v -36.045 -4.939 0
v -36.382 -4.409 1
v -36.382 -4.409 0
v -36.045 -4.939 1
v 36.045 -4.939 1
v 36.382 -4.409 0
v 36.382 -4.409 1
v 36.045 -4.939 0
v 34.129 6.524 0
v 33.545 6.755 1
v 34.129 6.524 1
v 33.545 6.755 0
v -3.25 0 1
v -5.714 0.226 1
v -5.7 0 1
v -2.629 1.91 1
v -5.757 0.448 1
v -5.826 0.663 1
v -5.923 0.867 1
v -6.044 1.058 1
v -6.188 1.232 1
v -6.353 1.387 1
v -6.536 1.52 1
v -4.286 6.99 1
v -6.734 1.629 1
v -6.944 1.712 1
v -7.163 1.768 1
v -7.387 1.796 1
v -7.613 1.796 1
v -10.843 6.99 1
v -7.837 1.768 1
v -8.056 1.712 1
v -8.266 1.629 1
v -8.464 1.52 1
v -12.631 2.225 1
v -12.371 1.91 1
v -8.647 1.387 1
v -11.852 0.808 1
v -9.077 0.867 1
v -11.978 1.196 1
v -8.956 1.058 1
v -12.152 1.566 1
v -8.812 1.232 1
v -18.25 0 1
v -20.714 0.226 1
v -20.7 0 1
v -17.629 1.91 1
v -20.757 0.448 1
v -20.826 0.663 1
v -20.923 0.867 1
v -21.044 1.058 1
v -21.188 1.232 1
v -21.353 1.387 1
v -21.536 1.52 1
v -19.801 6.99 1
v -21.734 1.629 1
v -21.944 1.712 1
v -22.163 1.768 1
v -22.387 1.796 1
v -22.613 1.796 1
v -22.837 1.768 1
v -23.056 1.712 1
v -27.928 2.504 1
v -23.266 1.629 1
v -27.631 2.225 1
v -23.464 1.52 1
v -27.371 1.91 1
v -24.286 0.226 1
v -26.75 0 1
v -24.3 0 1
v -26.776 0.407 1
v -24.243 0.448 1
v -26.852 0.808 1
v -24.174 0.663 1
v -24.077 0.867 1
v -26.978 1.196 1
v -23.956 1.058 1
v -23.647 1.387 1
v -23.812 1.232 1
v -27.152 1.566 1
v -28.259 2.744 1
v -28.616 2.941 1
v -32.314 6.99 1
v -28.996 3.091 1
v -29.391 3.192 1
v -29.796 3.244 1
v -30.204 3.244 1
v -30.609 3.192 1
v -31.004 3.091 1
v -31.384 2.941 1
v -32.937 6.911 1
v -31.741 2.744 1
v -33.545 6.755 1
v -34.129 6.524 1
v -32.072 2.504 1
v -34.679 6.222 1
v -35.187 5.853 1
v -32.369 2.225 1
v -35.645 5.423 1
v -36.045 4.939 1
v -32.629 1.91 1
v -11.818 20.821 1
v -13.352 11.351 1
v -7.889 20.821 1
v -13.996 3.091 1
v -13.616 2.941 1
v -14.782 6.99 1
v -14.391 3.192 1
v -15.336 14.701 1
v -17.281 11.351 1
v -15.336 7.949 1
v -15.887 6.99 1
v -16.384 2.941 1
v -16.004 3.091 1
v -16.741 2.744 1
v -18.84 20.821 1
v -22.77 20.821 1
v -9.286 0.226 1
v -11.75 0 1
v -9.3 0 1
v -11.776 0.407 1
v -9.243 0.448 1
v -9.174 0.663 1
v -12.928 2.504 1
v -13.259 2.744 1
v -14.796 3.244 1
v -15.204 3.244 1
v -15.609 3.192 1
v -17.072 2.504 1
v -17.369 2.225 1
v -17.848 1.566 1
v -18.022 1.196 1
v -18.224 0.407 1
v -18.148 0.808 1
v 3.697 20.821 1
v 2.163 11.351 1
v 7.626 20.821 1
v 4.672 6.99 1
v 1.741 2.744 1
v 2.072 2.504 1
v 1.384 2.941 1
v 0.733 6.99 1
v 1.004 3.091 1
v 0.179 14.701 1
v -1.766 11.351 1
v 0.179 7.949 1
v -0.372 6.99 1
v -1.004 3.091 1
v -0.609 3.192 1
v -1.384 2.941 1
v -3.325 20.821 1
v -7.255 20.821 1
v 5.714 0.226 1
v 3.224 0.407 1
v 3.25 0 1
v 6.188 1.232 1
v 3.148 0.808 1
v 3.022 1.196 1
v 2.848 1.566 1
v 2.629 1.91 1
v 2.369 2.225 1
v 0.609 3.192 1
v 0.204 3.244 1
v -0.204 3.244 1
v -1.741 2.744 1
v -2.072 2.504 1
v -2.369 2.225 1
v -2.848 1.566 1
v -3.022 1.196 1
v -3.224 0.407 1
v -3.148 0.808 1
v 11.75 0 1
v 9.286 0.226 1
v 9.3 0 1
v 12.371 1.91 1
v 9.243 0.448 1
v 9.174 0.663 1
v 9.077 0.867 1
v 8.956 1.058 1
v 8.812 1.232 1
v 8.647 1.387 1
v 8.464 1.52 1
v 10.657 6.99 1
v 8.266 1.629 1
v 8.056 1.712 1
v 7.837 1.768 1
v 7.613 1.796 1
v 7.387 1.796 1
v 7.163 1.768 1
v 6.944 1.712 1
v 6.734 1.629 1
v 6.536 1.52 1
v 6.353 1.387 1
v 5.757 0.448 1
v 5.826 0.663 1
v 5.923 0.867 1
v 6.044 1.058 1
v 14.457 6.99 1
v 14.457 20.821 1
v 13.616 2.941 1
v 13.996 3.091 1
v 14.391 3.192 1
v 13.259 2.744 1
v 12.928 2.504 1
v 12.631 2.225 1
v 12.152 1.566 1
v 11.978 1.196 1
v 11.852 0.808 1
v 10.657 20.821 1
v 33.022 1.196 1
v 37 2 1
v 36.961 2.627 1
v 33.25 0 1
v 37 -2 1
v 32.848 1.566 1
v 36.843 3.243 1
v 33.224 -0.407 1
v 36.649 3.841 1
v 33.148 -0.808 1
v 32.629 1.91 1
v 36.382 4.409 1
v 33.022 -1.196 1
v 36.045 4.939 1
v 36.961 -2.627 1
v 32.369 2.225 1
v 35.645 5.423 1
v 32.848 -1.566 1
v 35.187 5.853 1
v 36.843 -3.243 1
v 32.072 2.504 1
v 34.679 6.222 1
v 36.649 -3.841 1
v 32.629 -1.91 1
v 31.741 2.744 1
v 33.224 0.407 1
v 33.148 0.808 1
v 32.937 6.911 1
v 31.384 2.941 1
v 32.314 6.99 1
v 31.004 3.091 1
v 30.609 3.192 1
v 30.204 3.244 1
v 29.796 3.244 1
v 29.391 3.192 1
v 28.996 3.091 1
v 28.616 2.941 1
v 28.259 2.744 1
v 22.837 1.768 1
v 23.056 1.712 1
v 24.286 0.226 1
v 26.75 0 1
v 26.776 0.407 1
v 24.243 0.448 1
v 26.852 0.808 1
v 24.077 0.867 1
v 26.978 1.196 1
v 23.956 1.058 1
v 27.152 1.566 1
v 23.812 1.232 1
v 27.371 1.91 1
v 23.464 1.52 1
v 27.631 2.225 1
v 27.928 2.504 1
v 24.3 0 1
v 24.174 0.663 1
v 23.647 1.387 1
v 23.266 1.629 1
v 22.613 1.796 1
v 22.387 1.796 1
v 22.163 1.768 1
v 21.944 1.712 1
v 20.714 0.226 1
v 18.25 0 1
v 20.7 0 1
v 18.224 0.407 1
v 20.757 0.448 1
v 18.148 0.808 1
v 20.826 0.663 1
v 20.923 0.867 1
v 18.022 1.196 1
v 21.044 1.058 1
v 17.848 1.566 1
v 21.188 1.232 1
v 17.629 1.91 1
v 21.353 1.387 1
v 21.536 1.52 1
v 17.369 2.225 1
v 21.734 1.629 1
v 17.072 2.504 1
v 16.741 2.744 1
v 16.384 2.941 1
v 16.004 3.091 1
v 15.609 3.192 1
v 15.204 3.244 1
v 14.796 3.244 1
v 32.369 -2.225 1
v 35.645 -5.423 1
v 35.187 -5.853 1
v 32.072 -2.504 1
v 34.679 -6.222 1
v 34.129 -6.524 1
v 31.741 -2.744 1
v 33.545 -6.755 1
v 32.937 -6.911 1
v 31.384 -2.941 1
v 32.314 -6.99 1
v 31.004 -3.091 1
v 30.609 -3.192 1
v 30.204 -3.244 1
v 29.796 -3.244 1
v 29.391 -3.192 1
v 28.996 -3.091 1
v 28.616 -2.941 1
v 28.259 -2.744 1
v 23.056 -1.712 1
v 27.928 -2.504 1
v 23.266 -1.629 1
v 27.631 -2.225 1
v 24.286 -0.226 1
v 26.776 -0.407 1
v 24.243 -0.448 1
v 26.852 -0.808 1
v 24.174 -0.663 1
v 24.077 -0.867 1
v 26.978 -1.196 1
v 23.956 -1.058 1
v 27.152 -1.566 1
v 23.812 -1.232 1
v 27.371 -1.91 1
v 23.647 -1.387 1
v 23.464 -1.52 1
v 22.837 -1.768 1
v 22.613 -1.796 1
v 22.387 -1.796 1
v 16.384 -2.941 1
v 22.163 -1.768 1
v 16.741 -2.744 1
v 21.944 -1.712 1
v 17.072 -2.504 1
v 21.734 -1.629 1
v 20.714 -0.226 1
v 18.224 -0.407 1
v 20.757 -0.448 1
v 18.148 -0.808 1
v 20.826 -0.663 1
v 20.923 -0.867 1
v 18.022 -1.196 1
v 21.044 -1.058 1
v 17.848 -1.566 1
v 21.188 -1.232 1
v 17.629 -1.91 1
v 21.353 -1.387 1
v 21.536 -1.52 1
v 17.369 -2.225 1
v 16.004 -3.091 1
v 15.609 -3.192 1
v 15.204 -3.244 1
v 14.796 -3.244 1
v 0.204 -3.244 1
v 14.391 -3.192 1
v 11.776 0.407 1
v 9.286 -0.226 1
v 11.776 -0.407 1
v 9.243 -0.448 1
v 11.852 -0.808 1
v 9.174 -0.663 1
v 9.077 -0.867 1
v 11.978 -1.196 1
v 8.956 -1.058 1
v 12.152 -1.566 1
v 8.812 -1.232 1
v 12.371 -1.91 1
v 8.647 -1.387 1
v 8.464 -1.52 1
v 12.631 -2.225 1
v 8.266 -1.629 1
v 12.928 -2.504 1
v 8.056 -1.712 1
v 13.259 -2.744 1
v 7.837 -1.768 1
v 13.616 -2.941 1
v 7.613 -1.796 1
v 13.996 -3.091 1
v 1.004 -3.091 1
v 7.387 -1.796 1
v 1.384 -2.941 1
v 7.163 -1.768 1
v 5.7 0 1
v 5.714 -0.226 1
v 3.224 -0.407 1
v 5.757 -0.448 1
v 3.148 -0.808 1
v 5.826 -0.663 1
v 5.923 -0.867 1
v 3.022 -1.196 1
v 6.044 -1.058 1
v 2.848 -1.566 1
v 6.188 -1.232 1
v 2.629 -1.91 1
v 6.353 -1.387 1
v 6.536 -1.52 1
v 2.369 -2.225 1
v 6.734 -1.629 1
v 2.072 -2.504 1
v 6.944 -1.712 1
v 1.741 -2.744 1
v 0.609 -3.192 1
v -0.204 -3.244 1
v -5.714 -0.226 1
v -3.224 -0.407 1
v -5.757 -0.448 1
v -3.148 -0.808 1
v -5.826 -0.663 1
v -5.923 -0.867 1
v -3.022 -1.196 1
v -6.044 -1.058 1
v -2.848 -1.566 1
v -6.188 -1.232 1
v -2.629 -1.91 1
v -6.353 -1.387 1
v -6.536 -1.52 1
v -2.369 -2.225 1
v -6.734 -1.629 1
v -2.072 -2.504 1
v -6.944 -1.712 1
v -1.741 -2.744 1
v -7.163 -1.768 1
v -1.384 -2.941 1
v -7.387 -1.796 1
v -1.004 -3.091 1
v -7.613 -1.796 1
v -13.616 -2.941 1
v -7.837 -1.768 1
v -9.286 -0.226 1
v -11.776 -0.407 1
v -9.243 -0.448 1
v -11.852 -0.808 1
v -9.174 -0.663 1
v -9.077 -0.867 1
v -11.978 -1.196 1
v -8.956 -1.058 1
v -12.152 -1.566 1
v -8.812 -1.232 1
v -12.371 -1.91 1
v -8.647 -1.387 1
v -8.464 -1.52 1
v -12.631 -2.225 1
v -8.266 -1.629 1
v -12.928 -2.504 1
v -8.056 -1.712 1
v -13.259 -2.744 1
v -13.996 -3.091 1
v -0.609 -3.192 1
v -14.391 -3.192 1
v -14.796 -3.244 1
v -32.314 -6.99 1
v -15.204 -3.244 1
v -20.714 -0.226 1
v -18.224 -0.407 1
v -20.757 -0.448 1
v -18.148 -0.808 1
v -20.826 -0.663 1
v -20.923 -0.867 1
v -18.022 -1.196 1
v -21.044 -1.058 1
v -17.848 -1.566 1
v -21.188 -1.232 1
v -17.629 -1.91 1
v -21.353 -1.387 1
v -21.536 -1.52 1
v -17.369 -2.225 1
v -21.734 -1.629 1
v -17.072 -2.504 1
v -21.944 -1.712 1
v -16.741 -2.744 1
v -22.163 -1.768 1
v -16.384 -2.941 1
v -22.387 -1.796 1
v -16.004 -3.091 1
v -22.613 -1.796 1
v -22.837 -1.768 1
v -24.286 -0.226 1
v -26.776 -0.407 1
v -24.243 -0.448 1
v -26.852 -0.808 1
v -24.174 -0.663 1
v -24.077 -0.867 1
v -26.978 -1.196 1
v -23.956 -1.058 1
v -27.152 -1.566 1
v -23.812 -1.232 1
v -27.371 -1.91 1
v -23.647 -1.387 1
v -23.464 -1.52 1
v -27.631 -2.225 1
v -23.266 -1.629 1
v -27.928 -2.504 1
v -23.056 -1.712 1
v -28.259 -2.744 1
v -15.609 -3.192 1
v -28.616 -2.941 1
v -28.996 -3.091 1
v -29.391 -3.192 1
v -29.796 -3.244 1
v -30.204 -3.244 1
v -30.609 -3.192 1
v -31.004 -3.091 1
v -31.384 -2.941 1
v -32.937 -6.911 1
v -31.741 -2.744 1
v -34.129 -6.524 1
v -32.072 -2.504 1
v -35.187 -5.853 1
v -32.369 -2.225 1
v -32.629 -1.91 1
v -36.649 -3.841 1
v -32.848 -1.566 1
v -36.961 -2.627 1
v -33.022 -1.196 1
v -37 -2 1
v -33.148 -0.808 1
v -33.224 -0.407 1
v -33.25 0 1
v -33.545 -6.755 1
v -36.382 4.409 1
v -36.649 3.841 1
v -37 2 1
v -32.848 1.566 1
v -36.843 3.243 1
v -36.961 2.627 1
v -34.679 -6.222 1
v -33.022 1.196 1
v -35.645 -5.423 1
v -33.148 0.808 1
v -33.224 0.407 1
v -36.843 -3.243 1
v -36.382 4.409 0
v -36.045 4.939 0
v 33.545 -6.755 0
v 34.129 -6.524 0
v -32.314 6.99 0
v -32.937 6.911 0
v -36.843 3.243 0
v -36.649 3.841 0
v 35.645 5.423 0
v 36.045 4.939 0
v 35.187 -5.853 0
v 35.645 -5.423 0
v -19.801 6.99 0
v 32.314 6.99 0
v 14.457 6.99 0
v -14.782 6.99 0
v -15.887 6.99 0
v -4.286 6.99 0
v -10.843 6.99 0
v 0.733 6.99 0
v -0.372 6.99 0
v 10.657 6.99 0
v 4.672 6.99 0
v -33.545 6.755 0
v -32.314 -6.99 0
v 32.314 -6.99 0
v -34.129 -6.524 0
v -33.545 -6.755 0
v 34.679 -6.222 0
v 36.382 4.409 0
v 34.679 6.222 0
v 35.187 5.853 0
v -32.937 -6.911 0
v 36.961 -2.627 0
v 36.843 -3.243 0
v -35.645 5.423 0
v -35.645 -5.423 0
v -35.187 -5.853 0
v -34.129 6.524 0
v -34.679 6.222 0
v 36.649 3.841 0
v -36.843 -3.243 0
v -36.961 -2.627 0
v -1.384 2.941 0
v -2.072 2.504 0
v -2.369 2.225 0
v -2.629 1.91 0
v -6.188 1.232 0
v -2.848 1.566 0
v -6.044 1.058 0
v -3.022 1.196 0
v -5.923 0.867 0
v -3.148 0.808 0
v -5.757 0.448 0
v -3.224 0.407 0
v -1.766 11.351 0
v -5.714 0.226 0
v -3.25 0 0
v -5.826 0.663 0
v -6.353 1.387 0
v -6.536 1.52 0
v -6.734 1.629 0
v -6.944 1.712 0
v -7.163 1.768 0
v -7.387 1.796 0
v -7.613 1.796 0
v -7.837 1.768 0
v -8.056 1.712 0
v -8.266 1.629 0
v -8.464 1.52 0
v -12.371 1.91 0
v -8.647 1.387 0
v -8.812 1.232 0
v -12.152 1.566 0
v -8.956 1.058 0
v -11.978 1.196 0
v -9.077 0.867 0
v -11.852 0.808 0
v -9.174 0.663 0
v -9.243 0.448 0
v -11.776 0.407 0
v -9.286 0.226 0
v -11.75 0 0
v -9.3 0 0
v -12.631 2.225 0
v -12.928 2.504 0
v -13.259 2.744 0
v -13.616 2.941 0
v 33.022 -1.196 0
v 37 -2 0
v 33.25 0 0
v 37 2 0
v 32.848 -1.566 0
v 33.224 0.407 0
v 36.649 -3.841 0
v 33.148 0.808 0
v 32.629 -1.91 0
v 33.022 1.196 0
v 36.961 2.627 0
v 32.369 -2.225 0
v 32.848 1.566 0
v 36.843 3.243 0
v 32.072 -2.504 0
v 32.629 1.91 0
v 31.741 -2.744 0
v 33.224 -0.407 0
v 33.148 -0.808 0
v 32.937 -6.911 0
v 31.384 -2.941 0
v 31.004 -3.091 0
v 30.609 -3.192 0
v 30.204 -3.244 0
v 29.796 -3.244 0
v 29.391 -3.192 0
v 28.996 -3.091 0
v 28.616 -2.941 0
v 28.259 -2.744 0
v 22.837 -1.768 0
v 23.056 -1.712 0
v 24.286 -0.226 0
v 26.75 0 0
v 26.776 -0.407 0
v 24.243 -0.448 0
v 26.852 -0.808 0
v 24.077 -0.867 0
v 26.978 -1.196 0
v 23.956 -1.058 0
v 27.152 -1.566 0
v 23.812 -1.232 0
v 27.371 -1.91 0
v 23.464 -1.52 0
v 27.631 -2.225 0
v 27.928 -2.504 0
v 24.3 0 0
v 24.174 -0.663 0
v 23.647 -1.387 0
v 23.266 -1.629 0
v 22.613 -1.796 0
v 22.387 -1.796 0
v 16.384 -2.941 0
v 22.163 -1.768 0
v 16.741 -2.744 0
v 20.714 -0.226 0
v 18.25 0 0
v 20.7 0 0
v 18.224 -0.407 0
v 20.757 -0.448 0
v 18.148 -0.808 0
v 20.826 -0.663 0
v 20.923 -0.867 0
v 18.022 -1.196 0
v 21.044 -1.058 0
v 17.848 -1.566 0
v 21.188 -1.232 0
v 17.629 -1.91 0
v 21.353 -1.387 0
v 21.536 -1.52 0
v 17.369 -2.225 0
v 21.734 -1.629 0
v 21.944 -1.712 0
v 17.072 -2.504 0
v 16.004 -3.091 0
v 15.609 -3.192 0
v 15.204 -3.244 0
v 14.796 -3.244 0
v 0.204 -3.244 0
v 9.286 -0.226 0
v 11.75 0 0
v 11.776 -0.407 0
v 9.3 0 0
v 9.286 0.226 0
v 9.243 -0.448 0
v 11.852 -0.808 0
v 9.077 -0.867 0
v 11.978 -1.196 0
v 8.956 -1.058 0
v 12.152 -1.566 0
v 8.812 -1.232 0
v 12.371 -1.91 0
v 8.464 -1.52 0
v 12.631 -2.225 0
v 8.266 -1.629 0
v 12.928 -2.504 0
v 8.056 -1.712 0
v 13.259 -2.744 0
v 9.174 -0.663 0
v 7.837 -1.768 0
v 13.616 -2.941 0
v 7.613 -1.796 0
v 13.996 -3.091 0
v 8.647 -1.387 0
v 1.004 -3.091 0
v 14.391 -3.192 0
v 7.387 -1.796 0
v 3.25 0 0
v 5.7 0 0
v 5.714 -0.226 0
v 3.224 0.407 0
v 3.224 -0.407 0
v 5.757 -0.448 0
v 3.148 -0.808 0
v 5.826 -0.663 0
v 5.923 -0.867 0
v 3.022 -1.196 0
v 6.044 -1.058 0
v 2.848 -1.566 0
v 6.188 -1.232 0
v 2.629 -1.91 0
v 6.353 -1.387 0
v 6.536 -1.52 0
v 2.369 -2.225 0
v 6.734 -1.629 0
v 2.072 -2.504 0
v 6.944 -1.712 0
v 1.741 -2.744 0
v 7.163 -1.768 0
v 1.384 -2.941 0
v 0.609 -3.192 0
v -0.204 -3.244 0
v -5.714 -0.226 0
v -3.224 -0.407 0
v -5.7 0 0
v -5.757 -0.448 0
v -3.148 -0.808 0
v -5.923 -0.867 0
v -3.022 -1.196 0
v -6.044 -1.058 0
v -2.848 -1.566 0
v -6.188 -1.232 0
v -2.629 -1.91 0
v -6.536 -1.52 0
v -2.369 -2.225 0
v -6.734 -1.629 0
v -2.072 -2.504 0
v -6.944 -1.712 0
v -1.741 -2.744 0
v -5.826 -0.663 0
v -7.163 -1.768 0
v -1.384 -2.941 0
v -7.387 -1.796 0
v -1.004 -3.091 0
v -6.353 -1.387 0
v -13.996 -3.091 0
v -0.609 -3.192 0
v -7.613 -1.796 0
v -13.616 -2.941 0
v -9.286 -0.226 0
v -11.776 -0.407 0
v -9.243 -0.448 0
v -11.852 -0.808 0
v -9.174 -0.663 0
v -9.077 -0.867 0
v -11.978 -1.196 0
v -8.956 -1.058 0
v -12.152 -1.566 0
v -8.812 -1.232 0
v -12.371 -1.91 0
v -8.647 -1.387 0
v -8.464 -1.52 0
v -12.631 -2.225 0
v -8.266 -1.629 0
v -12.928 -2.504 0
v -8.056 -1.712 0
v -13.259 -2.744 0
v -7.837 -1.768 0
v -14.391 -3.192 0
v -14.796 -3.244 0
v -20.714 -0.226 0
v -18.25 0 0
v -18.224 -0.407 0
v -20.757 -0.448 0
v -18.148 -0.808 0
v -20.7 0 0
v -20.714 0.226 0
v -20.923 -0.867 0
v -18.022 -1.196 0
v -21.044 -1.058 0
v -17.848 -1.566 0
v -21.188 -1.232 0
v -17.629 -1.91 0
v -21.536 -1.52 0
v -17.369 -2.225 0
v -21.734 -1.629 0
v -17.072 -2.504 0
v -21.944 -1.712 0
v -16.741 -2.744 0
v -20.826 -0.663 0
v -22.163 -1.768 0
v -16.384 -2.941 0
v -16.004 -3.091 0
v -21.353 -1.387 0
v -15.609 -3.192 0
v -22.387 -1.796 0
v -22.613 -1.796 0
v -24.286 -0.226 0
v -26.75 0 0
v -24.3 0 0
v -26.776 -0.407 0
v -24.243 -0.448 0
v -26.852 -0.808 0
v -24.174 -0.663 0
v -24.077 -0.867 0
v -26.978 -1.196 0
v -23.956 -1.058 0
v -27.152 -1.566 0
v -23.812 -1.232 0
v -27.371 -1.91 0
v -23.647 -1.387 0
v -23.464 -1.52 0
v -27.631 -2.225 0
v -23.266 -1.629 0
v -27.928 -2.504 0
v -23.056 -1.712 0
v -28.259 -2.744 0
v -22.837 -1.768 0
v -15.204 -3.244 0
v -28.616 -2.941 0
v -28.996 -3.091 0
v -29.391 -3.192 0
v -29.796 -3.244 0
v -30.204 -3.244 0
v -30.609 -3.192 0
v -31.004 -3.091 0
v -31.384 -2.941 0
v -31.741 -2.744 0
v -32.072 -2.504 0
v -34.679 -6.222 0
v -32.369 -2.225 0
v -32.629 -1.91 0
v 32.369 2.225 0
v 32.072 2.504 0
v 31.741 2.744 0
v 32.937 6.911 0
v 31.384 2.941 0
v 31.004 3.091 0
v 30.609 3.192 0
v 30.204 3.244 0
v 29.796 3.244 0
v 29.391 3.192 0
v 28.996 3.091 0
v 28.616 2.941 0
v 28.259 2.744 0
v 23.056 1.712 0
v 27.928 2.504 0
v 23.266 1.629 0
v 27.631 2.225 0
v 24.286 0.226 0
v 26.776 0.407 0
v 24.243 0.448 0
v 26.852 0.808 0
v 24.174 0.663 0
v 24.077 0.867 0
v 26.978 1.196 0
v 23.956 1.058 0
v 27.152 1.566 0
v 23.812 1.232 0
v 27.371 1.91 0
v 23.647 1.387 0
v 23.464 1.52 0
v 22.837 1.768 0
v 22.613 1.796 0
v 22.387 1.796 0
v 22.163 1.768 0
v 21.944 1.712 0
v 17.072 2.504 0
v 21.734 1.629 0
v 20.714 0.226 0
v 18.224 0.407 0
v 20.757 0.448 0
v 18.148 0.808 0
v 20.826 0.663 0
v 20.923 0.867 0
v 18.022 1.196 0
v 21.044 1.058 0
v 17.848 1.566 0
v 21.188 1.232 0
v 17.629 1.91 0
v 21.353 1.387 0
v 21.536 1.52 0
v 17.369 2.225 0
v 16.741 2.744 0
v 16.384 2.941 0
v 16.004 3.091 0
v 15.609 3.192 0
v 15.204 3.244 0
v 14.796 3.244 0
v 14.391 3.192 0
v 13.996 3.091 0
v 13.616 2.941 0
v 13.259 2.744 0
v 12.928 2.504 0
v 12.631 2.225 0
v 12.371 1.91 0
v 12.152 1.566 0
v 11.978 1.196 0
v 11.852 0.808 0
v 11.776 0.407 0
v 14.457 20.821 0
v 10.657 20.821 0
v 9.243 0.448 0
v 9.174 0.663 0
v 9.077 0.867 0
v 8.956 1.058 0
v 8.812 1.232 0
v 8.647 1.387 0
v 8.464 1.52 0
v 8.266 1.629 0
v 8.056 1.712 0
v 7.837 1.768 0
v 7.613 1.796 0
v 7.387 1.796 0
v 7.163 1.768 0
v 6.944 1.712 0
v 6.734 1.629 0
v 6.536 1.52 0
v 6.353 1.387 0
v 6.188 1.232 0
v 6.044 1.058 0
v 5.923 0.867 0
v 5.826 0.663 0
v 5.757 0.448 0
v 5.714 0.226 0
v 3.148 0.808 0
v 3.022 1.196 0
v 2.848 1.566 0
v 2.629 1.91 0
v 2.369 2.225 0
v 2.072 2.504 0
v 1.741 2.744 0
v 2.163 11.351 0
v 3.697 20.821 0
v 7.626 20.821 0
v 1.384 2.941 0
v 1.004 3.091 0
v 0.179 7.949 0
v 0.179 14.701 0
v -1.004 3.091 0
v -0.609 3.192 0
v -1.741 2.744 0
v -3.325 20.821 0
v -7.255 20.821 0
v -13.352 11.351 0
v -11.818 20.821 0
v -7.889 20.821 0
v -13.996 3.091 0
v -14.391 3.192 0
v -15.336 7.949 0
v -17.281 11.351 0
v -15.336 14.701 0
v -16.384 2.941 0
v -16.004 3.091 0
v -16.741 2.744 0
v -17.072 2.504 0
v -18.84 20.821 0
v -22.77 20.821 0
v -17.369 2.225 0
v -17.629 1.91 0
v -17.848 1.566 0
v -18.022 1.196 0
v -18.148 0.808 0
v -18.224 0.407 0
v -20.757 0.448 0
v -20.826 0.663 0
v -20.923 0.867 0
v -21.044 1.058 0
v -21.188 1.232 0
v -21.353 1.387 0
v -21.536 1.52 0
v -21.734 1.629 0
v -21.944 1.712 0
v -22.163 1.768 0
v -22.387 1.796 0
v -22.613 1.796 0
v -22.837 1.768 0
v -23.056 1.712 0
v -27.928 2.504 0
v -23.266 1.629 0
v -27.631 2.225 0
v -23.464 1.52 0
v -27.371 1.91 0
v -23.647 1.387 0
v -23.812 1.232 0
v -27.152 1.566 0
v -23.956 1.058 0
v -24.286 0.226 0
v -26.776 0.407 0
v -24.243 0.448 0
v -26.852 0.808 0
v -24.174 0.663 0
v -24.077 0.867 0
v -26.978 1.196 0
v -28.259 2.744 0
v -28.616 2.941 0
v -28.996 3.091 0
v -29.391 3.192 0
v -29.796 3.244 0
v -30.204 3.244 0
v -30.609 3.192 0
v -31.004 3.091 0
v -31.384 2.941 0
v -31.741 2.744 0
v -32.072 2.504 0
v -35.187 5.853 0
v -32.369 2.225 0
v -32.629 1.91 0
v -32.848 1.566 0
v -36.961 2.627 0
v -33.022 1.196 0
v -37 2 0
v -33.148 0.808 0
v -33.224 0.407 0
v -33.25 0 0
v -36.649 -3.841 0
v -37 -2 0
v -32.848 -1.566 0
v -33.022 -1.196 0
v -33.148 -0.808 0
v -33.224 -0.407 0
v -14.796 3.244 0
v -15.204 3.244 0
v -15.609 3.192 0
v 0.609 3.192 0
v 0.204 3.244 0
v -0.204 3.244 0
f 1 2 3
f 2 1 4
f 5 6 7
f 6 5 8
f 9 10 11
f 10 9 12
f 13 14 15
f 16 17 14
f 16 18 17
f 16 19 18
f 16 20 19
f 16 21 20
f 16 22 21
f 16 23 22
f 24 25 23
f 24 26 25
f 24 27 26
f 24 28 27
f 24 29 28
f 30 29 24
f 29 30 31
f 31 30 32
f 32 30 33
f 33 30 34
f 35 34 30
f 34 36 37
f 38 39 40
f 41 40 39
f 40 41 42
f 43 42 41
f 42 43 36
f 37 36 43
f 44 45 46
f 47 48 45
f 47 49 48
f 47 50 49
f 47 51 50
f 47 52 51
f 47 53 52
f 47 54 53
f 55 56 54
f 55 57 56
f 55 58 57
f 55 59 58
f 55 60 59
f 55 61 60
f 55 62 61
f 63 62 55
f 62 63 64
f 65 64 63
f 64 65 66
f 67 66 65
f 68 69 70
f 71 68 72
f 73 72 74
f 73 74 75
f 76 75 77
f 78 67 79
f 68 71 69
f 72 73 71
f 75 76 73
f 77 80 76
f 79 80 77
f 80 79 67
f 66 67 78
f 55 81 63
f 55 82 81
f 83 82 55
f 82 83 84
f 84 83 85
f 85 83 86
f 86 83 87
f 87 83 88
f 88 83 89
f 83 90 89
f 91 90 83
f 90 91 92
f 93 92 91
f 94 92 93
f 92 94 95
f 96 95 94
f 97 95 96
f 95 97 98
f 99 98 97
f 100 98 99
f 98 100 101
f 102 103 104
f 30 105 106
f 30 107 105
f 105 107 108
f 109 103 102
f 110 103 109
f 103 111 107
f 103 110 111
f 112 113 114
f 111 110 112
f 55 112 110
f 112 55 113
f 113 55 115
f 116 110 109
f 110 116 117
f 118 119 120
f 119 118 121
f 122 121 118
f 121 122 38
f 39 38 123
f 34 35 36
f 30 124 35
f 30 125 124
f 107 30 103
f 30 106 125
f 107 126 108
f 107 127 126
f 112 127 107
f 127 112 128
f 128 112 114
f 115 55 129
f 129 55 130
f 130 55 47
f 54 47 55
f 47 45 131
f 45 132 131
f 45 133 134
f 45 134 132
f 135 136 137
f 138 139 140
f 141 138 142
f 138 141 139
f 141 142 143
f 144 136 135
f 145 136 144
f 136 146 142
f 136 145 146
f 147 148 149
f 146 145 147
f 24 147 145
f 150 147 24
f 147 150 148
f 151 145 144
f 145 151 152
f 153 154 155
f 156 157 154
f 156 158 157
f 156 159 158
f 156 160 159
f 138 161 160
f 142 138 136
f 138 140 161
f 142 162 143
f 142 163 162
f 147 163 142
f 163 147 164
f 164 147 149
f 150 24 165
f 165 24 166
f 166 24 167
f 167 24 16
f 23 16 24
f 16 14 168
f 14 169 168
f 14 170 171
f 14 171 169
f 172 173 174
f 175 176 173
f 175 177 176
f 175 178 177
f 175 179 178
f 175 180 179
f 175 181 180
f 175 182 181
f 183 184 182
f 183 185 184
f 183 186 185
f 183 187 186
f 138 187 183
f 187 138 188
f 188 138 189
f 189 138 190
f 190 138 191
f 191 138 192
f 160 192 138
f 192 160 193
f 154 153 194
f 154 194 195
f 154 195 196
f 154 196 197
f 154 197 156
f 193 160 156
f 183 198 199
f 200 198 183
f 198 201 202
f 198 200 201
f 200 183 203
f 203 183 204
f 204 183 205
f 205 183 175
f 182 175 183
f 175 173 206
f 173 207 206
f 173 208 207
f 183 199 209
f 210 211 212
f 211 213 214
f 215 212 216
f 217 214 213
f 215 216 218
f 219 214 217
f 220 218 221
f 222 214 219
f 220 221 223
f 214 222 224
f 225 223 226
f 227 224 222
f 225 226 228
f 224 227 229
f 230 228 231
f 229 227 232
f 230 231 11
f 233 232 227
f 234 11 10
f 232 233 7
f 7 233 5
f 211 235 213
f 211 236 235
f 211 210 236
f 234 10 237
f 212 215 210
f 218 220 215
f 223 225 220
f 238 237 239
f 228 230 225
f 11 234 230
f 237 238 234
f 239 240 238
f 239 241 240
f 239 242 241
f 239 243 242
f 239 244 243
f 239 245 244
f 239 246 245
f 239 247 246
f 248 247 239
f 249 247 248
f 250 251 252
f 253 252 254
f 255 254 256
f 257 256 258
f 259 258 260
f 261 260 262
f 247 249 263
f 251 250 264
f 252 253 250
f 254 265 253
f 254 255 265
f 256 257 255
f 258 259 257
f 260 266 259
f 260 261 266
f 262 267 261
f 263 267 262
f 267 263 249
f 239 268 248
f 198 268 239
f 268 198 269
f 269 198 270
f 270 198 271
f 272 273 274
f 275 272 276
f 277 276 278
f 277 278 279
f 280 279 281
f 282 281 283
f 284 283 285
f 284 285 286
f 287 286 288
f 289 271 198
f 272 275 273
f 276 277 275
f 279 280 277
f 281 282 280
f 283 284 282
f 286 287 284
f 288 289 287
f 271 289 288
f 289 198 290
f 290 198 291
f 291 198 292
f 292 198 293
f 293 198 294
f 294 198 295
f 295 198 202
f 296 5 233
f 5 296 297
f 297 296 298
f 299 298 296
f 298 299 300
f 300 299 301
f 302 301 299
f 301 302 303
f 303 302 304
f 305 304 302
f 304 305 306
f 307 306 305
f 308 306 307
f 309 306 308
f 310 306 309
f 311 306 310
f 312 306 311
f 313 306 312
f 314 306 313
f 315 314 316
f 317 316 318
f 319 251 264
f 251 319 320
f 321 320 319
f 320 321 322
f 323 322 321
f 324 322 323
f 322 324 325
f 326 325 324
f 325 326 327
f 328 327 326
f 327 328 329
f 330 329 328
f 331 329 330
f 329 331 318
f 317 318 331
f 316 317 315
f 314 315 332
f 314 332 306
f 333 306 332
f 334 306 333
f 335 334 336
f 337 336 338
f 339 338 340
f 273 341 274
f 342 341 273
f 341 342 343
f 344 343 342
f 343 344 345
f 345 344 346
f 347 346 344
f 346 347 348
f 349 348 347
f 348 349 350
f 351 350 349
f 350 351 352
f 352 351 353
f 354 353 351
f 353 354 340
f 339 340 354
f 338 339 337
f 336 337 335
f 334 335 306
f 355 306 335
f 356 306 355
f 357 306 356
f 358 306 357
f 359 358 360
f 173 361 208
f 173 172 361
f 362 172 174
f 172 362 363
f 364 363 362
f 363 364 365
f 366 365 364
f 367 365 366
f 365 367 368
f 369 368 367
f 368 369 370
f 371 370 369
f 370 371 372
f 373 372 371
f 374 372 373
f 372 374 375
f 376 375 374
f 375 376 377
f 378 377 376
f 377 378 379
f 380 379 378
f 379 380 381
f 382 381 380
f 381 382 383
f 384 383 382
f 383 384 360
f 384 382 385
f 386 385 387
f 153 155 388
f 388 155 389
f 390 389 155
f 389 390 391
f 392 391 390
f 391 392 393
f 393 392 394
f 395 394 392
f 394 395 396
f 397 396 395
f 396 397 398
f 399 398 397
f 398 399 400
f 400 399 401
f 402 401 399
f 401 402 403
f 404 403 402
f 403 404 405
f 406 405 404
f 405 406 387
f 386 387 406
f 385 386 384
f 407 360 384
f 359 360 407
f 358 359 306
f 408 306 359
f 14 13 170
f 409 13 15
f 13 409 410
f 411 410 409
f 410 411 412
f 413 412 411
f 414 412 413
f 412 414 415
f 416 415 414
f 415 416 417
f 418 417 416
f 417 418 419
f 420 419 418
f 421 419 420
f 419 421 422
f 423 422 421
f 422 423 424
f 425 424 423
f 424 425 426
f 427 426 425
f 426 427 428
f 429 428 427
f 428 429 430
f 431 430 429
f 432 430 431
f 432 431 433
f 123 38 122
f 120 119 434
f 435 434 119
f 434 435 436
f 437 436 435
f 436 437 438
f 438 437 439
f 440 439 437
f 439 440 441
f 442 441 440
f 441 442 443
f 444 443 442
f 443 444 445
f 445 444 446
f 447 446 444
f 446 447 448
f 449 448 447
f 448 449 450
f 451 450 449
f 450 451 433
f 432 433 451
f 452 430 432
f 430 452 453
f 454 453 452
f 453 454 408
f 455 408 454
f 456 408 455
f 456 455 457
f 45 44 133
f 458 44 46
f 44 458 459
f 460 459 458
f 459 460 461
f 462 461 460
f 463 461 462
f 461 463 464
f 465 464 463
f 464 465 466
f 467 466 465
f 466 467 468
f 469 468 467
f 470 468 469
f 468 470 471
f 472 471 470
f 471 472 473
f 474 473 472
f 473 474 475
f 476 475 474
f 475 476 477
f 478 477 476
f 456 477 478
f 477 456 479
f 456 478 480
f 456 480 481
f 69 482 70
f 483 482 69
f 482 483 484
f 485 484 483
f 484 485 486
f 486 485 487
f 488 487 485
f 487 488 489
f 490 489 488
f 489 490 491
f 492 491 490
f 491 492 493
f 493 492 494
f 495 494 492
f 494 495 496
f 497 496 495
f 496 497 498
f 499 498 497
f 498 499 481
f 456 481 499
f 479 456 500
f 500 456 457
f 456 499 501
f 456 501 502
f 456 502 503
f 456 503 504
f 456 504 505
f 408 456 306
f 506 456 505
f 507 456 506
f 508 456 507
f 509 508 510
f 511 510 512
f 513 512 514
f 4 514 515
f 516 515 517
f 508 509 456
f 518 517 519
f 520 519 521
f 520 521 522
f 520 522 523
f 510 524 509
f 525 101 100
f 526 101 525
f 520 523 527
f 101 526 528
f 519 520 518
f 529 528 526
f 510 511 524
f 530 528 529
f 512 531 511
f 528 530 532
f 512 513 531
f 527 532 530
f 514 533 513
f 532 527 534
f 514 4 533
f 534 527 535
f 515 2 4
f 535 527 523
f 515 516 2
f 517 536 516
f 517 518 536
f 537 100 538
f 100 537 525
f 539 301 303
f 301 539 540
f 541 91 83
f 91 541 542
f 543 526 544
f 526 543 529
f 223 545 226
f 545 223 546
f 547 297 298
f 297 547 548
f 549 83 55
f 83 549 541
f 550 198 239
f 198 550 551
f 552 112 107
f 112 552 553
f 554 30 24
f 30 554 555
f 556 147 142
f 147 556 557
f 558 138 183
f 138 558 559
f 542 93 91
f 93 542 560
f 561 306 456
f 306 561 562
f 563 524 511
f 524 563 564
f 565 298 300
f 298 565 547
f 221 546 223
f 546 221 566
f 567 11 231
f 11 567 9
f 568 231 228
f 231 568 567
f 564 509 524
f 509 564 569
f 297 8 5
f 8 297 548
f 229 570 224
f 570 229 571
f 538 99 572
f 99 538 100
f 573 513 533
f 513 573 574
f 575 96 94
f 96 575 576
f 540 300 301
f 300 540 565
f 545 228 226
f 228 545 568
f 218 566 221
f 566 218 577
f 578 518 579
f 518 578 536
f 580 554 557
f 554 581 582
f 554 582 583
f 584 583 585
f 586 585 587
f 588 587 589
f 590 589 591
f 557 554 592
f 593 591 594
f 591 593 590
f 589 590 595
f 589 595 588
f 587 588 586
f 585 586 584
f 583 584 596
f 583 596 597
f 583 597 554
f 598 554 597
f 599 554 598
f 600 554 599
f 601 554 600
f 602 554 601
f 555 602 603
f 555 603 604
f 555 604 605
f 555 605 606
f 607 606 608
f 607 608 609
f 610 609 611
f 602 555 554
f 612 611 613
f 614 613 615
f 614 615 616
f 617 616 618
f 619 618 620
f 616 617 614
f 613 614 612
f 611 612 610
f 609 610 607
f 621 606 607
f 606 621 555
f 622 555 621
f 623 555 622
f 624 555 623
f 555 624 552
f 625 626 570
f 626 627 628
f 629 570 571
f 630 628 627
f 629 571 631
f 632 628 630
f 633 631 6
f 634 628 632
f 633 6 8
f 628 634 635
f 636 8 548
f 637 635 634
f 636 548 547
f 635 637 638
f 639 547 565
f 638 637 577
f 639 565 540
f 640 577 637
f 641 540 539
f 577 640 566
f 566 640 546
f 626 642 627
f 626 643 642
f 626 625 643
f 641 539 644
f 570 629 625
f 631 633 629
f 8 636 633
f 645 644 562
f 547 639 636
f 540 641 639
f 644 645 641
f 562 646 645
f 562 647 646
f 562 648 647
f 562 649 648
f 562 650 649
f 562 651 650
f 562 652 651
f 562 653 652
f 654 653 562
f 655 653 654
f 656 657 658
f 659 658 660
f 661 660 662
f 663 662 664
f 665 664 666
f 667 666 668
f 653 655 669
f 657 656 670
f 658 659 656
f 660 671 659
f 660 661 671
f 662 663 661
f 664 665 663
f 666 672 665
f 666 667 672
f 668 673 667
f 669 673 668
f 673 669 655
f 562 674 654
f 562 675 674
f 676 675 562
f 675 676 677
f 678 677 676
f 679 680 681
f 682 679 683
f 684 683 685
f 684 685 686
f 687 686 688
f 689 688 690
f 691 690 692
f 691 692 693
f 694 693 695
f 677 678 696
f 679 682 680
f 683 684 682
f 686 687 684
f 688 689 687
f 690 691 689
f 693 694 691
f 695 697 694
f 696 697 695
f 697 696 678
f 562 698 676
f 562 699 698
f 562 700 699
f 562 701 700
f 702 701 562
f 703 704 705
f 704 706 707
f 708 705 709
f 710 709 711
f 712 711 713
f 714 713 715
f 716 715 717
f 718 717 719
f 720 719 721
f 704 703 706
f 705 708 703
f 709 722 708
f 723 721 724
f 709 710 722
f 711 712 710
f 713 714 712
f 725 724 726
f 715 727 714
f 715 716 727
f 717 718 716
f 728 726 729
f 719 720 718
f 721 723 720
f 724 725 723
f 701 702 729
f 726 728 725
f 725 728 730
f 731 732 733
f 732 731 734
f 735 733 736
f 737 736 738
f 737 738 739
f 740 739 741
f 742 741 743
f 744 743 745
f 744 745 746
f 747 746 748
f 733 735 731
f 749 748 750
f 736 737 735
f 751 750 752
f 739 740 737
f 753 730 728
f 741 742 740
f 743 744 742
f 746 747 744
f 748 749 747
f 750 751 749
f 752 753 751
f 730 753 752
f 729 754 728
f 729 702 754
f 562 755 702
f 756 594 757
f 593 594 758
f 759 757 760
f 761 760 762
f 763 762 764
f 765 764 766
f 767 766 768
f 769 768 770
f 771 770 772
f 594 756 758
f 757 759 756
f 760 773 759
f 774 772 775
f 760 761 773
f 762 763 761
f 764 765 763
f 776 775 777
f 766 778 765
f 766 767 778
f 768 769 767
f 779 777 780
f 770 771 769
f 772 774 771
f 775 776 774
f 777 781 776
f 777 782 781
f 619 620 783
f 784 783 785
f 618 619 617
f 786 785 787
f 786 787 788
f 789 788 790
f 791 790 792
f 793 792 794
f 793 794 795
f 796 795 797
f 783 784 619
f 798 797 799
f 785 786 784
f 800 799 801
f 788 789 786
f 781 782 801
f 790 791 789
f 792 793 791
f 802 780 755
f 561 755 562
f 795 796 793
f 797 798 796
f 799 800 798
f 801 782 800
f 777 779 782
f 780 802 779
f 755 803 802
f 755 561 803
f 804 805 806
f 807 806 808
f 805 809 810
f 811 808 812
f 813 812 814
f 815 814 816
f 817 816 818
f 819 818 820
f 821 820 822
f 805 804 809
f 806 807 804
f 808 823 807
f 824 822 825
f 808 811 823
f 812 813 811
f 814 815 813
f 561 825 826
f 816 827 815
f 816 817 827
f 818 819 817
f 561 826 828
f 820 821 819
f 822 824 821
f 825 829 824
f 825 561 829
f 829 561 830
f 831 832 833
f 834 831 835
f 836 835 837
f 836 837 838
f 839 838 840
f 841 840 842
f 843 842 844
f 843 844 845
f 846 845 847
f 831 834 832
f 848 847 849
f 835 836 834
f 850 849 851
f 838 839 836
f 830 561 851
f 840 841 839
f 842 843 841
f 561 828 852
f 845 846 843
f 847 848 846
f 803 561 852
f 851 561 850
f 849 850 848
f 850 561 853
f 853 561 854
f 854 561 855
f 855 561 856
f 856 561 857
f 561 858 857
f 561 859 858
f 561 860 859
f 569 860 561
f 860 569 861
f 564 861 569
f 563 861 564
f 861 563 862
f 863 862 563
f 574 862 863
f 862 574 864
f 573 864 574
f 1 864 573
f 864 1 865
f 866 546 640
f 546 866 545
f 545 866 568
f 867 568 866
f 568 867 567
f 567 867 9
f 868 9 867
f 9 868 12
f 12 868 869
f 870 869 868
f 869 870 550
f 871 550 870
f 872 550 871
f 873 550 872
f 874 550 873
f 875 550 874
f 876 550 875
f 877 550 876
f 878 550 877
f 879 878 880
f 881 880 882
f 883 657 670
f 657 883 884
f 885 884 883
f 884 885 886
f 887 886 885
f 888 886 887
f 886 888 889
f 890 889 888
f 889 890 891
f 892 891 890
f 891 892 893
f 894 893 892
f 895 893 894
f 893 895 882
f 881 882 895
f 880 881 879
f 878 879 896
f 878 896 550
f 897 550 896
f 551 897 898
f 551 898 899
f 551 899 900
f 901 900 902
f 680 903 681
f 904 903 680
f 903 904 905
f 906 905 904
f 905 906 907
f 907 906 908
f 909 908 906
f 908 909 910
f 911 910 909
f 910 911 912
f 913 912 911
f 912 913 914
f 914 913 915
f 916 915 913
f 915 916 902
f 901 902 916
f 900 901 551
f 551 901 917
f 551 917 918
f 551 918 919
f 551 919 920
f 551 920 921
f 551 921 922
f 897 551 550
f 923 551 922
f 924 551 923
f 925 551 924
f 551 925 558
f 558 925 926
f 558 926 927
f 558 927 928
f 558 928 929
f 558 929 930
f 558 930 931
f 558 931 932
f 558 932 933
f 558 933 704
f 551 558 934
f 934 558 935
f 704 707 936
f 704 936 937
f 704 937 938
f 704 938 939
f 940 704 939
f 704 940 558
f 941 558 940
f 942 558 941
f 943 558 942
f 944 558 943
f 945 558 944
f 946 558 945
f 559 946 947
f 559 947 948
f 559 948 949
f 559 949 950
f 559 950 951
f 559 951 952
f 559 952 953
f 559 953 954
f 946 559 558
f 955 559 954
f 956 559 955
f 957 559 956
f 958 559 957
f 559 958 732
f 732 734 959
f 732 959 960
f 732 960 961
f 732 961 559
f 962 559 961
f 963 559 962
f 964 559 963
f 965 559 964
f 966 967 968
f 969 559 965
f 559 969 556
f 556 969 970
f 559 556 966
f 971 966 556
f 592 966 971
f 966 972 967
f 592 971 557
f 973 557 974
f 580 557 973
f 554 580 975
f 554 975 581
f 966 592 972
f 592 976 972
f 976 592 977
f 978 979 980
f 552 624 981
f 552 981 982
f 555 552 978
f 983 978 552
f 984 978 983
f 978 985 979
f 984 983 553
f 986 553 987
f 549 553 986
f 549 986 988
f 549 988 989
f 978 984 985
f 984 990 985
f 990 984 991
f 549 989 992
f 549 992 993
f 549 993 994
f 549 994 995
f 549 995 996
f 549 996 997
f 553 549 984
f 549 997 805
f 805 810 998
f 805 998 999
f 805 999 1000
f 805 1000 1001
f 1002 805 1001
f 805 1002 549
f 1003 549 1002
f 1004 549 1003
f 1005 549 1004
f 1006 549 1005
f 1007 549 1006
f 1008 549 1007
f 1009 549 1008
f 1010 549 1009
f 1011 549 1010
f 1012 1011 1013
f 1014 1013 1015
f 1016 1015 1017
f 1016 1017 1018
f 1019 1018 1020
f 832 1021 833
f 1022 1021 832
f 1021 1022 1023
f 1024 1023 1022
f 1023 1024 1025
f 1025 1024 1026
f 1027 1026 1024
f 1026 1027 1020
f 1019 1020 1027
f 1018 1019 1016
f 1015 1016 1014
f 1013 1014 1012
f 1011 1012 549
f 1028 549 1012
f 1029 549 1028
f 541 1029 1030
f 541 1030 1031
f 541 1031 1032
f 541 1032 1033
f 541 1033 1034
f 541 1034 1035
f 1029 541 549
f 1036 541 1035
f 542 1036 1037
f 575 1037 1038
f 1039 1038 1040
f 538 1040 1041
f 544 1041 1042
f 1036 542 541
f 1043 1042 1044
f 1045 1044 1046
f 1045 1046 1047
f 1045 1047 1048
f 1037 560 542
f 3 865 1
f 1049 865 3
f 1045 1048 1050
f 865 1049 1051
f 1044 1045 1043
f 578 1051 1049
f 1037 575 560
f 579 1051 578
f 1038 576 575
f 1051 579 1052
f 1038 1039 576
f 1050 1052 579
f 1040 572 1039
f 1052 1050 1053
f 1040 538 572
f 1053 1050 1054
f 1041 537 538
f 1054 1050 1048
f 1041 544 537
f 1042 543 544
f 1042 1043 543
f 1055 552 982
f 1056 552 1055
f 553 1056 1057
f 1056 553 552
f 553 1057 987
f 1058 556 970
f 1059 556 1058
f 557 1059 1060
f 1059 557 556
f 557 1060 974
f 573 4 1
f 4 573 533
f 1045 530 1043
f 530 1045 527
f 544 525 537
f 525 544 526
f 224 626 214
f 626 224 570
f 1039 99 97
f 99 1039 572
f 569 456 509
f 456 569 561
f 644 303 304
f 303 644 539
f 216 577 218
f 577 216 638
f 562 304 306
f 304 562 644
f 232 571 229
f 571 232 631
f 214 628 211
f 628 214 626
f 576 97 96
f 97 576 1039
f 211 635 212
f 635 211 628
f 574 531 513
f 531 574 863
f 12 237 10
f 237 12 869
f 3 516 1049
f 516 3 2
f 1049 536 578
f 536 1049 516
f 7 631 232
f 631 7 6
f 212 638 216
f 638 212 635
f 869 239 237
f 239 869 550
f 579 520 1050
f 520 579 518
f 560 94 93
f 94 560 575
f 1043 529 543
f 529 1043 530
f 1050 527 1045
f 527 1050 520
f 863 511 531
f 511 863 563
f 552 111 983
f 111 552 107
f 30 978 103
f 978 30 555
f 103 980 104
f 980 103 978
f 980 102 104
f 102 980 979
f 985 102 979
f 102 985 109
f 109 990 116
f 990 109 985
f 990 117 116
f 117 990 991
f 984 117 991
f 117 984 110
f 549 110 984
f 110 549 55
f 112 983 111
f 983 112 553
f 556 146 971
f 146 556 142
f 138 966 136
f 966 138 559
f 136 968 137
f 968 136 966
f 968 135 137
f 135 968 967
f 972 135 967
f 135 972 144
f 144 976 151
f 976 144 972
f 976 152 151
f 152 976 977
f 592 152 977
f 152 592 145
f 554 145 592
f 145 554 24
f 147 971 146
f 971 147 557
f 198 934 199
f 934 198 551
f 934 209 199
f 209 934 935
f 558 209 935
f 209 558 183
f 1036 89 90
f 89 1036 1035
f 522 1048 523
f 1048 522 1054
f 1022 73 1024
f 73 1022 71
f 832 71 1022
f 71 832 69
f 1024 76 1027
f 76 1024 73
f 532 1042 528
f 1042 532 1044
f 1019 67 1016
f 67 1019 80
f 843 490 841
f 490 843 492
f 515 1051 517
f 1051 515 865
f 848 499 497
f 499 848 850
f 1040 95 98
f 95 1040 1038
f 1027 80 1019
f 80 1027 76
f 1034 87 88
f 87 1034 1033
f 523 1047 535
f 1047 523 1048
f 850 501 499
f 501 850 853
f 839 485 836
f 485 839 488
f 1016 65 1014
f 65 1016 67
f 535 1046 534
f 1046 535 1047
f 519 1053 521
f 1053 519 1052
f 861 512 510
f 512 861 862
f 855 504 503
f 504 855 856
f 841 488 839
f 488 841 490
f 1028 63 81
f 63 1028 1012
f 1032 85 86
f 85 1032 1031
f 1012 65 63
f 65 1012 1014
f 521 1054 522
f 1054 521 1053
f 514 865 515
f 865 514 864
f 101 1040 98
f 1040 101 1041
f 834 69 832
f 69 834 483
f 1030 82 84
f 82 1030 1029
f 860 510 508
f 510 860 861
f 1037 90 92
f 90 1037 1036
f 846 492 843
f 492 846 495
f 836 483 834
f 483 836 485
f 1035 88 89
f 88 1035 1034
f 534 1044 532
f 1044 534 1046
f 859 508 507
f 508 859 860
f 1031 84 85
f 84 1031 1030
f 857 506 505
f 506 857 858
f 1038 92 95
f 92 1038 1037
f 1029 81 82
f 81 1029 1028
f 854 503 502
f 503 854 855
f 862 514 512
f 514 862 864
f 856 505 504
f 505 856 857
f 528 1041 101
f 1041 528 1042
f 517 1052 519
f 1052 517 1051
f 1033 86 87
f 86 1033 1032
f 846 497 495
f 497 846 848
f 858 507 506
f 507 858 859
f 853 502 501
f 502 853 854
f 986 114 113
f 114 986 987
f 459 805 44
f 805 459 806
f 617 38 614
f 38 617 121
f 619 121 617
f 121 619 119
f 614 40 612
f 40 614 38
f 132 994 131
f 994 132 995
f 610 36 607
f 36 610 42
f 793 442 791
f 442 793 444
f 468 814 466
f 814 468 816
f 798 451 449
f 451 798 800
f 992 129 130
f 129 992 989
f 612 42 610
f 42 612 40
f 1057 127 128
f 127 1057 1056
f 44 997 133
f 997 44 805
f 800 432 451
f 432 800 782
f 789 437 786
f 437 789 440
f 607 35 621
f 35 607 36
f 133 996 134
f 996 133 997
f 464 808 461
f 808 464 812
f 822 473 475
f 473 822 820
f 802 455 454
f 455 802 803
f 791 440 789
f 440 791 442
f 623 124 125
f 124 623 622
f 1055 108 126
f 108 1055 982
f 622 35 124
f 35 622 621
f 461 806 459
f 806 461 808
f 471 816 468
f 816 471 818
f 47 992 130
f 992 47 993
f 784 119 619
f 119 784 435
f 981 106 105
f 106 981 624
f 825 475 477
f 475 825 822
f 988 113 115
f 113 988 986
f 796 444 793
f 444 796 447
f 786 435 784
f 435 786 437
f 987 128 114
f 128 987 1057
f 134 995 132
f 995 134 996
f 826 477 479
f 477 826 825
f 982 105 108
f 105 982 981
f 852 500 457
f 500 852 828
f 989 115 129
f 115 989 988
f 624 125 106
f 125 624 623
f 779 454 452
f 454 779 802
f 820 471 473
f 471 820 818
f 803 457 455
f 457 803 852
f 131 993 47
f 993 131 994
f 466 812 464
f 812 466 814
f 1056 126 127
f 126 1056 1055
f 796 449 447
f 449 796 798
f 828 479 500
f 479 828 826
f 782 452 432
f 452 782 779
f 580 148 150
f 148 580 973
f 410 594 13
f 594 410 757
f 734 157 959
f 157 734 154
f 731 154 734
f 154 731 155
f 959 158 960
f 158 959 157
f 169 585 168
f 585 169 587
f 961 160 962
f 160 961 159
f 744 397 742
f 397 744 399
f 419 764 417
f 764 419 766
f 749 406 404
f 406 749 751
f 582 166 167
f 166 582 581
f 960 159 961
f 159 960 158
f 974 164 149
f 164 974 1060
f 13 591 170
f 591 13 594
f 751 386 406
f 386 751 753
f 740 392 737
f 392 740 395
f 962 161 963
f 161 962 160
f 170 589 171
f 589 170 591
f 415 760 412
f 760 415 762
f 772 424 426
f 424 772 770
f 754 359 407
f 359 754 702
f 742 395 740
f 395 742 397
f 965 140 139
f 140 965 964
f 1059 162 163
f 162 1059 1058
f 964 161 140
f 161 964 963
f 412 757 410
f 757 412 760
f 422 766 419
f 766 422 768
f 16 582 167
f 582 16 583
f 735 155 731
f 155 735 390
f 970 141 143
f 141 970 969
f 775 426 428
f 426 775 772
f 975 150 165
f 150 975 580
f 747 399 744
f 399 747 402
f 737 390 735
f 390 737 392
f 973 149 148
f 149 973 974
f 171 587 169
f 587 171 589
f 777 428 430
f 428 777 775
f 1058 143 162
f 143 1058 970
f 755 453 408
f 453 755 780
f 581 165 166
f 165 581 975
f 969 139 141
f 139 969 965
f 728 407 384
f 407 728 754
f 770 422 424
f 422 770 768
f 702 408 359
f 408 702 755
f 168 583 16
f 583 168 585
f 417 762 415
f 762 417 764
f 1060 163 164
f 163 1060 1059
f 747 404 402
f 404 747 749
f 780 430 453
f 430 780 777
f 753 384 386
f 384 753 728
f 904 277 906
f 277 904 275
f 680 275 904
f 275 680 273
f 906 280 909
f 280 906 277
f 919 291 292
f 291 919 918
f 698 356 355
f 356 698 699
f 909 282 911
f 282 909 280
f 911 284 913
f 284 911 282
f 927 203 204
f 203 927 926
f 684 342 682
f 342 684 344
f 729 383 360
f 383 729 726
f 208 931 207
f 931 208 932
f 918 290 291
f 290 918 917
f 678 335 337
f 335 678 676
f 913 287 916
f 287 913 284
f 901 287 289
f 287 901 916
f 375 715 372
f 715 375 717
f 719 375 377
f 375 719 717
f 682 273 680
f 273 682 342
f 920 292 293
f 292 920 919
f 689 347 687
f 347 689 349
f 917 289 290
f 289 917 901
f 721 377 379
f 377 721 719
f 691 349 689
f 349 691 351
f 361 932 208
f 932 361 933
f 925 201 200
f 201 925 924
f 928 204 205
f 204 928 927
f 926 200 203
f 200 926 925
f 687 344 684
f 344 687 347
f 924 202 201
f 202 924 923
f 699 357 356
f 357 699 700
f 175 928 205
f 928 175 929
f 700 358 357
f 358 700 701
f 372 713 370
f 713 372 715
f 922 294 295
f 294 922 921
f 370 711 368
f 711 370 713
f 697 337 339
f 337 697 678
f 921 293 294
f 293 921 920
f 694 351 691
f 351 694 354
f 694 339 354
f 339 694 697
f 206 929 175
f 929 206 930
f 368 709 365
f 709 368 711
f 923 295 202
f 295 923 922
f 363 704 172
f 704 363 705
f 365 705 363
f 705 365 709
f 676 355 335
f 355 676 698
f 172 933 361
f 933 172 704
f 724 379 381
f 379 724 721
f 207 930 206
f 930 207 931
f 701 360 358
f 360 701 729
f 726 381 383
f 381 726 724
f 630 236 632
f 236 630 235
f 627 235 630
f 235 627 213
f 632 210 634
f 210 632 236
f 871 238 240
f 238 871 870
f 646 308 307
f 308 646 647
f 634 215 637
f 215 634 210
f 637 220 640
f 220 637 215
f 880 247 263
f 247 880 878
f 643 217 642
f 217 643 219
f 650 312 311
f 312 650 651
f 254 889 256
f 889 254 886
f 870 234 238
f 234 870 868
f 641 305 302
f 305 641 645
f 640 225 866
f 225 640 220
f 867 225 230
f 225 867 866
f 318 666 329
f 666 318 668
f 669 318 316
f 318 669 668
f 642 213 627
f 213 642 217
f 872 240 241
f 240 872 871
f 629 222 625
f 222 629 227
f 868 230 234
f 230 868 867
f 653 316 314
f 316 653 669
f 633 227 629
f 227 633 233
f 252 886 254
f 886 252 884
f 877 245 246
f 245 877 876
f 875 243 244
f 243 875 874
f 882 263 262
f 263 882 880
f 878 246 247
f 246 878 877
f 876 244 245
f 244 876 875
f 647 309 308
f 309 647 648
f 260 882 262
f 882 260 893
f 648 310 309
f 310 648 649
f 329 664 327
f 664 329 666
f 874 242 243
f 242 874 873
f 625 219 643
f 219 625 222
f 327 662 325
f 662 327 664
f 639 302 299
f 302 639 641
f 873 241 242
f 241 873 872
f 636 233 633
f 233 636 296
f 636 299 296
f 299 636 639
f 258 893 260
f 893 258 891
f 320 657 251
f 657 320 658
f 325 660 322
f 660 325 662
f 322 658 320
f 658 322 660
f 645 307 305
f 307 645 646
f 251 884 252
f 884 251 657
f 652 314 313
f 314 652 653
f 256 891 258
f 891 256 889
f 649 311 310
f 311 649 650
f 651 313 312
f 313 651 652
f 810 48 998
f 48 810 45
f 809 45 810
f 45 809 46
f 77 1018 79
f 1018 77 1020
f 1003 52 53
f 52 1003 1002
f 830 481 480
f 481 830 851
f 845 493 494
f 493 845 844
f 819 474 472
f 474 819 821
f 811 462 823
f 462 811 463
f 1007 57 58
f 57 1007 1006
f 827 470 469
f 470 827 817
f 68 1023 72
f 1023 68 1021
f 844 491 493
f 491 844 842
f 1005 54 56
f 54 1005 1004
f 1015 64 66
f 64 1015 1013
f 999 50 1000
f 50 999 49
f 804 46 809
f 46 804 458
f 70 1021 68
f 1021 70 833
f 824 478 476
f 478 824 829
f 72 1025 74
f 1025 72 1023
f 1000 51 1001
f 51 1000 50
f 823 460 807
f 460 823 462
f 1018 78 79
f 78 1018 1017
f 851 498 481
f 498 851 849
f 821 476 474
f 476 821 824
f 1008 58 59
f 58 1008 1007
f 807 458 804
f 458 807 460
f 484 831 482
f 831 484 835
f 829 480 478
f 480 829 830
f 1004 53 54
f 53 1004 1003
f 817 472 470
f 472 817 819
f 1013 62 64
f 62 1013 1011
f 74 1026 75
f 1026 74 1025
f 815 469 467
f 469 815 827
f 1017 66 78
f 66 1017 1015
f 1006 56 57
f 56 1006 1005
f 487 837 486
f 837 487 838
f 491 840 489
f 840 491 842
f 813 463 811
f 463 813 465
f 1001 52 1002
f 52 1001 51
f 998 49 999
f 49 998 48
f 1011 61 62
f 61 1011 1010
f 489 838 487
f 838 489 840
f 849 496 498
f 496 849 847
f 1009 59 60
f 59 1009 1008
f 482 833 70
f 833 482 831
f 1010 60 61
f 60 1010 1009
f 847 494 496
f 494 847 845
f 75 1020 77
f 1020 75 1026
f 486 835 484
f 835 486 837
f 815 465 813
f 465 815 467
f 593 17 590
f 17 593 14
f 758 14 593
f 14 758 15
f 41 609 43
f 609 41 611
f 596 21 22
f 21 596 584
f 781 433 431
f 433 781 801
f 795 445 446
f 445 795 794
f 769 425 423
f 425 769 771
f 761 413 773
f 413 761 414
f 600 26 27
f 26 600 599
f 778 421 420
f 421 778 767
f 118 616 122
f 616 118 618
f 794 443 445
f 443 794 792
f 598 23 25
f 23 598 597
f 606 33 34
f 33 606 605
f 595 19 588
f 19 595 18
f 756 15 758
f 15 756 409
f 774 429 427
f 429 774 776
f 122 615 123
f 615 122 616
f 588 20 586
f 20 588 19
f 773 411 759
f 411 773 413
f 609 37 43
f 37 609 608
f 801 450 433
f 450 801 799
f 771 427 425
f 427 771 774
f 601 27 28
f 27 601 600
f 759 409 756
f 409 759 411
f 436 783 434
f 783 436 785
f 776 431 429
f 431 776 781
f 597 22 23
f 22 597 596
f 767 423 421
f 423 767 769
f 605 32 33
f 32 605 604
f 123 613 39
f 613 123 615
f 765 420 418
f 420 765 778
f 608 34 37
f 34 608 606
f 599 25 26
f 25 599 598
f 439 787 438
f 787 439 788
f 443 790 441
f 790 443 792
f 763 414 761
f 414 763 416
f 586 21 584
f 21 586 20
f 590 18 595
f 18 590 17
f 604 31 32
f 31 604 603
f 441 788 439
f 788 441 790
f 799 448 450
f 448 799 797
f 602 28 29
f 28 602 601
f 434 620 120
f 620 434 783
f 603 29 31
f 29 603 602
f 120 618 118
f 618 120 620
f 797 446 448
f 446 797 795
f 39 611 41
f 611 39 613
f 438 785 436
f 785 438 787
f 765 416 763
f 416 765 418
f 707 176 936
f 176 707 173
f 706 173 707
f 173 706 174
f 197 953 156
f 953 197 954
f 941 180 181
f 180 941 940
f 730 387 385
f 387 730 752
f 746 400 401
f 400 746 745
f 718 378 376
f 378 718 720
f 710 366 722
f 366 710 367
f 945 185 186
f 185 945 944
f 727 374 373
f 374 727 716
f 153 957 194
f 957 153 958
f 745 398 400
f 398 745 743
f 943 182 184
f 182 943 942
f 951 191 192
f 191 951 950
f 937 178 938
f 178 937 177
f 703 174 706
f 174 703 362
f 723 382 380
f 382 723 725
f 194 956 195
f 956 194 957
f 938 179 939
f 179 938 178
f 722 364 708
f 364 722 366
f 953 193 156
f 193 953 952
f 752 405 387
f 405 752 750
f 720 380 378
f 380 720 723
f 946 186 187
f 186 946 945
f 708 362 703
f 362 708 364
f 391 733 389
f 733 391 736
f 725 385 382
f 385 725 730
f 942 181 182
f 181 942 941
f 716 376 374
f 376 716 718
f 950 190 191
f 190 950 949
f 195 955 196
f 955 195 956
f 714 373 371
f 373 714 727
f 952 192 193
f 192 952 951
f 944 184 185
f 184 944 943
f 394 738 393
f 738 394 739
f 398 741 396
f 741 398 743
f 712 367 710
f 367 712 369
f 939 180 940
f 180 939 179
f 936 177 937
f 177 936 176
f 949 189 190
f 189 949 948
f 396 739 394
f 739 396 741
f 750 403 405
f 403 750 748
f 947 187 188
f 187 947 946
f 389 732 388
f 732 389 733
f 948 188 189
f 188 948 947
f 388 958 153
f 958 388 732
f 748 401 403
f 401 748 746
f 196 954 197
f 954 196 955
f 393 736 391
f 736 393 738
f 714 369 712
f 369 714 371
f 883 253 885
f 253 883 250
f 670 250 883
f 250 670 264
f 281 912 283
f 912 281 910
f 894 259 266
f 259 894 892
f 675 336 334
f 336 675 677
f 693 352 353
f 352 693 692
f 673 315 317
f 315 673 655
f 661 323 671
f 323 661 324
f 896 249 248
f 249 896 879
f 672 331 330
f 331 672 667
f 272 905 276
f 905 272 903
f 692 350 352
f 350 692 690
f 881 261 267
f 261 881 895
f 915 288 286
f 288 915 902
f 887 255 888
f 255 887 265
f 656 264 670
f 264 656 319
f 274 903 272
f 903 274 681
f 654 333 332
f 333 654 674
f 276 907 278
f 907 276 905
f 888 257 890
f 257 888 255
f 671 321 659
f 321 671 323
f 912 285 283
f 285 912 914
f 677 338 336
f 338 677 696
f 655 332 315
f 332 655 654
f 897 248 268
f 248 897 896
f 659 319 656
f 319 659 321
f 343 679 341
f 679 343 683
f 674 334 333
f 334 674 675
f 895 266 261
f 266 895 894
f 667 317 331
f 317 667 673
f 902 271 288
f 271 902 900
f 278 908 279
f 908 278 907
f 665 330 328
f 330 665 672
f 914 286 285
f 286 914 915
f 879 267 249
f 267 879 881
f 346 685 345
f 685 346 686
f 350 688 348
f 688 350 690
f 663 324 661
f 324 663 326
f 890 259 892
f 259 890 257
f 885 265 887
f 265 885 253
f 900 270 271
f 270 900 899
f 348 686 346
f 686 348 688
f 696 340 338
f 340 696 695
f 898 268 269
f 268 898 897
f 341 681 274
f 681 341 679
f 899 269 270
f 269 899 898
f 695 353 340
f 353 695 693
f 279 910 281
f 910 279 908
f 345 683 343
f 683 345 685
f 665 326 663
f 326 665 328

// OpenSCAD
$fn = 50;


difference() {
	union() {
		hull() {
			translate(v = [-32.0000000000, 2.0000000000, 0]) {
				cylinder(h = 1, r = 5);
			}
			translate(v = [32.0000000000, 2.0000000000, 0]) {
				cylinder(h = 1, r = 5);
			}
			translate(v = [-32.0000000000, -2.0000000000, 0]) {
				cylinder(h = 1, r = 5);
			}
			translate(v = [32.0000000000, -2.0000000000, 0]) {
				cylinder(h = 1, r = 5);
			}
		}
		translate(v = [0, 20.3703703704, 0]) {
			linear_extrude(height = 1) {
				text(font = "DejaVu Sans Mono:style=Bold", halign = "center", size = 19.0000000000, text = "XXL", valign = "top");
			}
		}
	}
	union() {
		translate(v = [-30.0000000000, 0.0000000000, 0]) {
			translate(v = [0, 0, -100]) {
				cylinder(h = 200, r = 3.2500000000);
			}
		}
		translate(v = [-15.0000000000, 0.0000000000, 0]) {
			translate(v = [0, 0, -100]) {
				cylinder(h = 200, r = 3.2500000000);
			}
		}
		translate(v = [0, 0, -100]) {
			cylinder(h = 200, r = 3.2500000000);
		}
		translate(v = [15.0000000000, 0.0000000000, 0]) {
			translate(v = [0, 0, -100]) {
				cylinder(h = 200, r = 3.2500000000);
			}
		}
		translate(v = [30.0000000000, 0.0000000000, 0]) {
			translate(v = [0, 0, -100]) {
				cylinder(h = 200, r = 3.2500000000);
			}
		}
		translate(v = [-30.0000000000, 0.0000000000, 0]) {
			translate(v = [0, 0, -100]) {
				cylinder(h = 200, r = 1.8000000000);
			}
		}
		translate(v = [-22.5000000000, 0.0000000000, 0]) {
			translate(v = [0, 0, -100]) {
				cylinder(h = 200, r = 1.8000000000);
			}
		}
		translate(v = [-15.0000000000, 0.0000000000, 0]) {
			translate(v = [0, 0, -100]) {
				cylinder(h = 200, r = 1.8000000000);
			}
		}
		translate(v = [-7.5000000000, 0.0000000000, 0]) {
			translate(v = [0, 0, -100]) {
				cylinder(h = 200, r = 1.8000000000);
			}
		}
		translate(v = [0, 0, -100]) {
			cylinder(h = 200, r = 1.8000000000);
		}
		translate(v = [7.5000000000, 0.0000000000, 0]) {
			translate(v = [0, 0, -100]) {
				cylinder(h = 200, r = 1.8000000000);
			}
		}
		translate(v = [15.0000000000, 0.0000000000, 0]) {
			translate(v = [0, 0, -100]) {
				cylinder(h = 200, r = 1.8000000000);
			}
		}
		translate(v = [22.5000000000, 0.0000000000, 0]) {
			translate(v = [0, 0, -100]) {
				cylinder(h = 200, r = 1.8000000000);
			}
		}
		translate(v = [30.0000000000, 0.0000000000, 0]) {
			translate(v = [0, 0, -100]) {
				cylinder(h = 200, r = 1.8000000000);
			}
		}
	}
}
